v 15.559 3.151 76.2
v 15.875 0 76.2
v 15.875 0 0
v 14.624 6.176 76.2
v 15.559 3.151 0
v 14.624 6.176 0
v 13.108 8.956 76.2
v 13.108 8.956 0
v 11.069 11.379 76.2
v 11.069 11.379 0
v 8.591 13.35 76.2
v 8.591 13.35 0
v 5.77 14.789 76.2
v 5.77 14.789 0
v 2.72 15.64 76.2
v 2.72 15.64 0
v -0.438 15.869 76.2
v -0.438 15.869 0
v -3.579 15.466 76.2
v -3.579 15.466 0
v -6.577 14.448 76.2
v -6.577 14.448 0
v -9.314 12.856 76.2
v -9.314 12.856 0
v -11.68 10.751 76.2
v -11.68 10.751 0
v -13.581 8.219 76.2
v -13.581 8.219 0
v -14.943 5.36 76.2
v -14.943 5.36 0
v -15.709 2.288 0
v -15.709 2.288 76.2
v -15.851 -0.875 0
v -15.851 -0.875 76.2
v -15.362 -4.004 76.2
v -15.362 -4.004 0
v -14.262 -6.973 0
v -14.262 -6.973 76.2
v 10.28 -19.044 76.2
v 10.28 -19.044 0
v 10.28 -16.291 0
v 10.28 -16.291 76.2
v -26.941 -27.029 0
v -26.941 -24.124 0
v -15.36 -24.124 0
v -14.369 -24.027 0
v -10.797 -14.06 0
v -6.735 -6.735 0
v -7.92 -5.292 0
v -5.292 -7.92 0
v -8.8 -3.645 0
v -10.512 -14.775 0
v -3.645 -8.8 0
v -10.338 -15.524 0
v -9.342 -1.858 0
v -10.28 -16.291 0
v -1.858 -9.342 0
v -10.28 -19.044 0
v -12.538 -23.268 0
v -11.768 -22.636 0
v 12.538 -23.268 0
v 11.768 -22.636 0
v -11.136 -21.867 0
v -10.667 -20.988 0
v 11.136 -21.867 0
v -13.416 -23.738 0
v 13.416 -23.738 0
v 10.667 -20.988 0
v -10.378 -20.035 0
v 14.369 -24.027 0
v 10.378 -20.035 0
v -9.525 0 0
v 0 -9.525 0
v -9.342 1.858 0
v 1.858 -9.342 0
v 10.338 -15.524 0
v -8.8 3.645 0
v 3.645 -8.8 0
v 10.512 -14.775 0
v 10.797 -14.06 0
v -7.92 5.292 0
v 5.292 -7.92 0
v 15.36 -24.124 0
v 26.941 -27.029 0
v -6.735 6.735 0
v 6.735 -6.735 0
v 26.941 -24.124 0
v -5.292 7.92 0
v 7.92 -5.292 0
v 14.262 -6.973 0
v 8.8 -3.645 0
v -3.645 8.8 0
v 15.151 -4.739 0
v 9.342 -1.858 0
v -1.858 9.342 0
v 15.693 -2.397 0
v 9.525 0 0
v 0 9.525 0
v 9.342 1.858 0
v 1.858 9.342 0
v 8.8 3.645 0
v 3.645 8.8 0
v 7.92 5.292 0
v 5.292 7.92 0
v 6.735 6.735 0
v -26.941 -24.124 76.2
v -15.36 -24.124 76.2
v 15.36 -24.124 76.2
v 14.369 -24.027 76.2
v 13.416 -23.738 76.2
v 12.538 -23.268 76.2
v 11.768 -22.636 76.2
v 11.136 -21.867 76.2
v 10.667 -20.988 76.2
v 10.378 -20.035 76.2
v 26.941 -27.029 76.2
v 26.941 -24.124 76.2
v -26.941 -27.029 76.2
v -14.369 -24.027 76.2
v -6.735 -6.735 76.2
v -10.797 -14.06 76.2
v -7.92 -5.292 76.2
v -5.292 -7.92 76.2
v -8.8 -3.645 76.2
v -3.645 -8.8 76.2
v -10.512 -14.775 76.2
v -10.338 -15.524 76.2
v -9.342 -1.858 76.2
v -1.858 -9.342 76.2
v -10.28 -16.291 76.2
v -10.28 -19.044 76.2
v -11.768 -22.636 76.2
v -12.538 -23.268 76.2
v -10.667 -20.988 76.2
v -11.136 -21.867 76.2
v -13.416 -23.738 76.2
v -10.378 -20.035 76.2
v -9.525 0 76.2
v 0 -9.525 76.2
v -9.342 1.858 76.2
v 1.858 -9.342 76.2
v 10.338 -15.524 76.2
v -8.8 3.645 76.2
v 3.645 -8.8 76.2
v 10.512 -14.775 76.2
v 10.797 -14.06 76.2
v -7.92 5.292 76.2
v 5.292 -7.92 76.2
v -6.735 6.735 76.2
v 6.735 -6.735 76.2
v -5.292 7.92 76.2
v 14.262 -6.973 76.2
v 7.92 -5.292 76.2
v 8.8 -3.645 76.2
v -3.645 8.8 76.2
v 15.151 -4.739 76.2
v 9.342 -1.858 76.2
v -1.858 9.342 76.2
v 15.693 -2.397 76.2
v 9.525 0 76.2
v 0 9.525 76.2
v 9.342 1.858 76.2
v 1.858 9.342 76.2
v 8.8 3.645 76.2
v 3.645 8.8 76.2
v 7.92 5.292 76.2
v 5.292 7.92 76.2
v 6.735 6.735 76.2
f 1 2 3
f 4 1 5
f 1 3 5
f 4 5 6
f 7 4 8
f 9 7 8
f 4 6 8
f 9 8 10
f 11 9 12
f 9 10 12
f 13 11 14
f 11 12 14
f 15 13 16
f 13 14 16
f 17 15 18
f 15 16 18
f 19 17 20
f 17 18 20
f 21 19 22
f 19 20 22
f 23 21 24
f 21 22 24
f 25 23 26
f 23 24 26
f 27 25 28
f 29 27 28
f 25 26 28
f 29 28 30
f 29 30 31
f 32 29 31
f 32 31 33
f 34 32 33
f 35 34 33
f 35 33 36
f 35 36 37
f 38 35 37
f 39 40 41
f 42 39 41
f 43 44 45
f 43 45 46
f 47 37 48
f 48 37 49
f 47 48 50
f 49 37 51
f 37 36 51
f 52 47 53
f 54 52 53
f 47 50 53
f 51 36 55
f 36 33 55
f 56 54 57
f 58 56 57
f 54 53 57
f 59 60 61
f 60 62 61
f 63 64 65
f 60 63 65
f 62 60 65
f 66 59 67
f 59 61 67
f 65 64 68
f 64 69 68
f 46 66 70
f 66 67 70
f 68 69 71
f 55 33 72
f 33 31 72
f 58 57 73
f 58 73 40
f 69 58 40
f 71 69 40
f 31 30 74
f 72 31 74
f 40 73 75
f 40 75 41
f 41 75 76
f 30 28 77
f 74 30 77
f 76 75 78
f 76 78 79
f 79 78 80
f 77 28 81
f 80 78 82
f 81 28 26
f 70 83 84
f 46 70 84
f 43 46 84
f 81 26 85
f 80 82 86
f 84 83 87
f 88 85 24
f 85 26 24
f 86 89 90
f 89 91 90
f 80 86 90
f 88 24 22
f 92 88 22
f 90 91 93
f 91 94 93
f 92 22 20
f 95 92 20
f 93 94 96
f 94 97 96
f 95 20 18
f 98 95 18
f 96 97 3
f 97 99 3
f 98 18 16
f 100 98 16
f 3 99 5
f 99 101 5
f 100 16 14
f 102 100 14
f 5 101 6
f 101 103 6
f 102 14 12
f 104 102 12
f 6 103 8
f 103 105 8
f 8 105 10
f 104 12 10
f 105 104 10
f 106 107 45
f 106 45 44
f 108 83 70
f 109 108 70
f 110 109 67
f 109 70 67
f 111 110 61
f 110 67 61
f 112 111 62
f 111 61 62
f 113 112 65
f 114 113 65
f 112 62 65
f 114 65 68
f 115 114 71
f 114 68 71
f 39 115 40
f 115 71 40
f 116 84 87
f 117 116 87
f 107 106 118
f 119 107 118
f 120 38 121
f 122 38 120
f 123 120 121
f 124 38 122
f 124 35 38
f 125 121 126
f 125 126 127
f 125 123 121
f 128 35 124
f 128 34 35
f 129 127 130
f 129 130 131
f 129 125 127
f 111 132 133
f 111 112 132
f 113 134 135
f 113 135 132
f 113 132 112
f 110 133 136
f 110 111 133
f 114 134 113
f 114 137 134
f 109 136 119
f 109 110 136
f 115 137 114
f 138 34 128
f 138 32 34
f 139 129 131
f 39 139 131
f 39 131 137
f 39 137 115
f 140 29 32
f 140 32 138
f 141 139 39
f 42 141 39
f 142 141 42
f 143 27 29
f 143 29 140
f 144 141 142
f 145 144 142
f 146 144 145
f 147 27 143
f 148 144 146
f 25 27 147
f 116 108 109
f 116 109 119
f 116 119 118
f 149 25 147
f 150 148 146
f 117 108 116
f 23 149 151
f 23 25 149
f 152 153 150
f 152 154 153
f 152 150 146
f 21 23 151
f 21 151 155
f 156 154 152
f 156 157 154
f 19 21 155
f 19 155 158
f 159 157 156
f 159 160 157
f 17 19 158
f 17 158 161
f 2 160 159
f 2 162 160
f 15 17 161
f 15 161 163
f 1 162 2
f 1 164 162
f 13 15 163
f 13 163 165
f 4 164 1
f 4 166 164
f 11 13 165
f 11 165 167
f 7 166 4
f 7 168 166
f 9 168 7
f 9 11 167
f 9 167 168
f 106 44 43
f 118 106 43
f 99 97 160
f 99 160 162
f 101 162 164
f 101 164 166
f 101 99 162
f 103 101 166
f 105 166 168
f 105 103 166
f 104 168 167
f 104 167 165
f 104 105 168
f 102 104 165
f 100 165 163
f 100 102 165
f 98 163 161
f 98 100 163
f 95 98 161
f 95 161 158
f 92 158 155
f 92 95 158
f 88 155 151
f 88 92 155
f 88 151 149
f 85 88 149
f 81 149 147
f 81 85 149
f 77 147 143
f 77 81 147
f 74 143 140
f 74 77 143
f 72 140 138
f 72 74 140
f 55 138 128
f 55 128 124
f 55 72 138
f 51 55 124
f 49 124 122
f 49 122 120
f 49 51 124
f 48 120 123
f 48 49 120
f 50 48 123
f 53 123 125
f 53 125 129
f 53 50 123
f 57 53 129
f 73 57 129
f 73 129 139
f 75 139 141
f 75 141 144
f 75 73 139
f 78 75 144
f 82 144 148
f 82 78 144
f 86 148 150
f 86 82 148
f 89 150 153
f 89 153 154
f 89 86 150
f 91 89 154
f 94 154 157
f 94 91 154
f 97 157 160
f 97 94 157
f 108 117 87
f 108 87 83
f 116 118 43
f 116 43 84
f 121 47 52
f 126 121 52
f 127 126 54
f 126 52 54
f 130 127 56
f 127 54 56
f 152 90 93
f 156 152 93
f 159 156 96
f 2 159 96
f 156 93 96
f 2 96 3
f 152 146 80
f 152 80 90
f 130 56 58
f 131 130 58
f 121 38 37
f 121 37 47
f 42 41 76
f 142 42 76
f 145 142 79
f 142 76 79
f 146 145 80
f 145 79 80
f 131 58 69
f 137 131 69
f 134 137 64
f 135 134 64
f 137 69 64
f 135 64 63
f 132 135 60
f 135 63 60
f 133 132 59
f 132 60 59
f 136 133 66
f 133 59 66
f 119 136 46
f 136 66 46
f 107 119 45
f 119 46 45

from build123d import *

# Parameters (mm, degrees)
F0_R     = 9.525
F1_DEPTH = 76.2


with BuildPart() as f1:
    # F0 (on Top) → F1 (new body)
    with BuildSketch(Plane.XY):
        with BuildLine():
            ThreePointArc((14.261609, -6.972958), (0, -15.875), (-14.261609, -6.972958))
            Line((-14.261609, -6.972958), (-10.796512, -14.06003))
            ThreePointArc((-10.796512, -14.06003), (-10.410981, -15.146229), (-10.280226, -16.291377))
            Line((-10.280226, -16.291377), (-10.280226, -19.044231))
            ThreePointArc((-10.280226, -19.044231), (-11.768124, -22.636333), (-15.360226, -24.124231))
            Line((-15.360226, -24.124231), (-26.940812, -24.124231))
            Line((-26.940812, -24.124231), (-26.940812, -27.02905))
            Line((-26.940812, -27.02905), (26.940812, -27.02905))
            Line((26.940812, -27.02905), (26.940812, -24.124231))
            Line((26.940812, -24.124231), (15.360226, -24.124231))
            ThreePointArc((15.360226, -24.124231), (11.768124, -22.636333), (10.280226, -19.044231))
            Line((10.280226, -19.044231), (10.280226, -16.291377))
            ThreePointArc((10.280226, -16.291377), (10.410981, -15.146229), (10.796512, -14.06003))
            Line((10.796512, -14.06003), (14.261609, -6.972958))
        make_face()
        with BuildLine():
            ThreePointArc((14.261609, -6.972958), (15.466394, -3.578588), (15.875, 0))
            ThreePointArc((15.875, 0), (-3.578588, 15.466394), (-14.261609, -6.972958))
            ThreePointArc((-14.261609, -6.972958), (0, -15.875), (14.261609, -6.972958))
        make_face()
        Circle(F0_R, mode=Mode.SUBTRACT)
    extrude(amount=F1_DEPTH)


solid = f1.part
